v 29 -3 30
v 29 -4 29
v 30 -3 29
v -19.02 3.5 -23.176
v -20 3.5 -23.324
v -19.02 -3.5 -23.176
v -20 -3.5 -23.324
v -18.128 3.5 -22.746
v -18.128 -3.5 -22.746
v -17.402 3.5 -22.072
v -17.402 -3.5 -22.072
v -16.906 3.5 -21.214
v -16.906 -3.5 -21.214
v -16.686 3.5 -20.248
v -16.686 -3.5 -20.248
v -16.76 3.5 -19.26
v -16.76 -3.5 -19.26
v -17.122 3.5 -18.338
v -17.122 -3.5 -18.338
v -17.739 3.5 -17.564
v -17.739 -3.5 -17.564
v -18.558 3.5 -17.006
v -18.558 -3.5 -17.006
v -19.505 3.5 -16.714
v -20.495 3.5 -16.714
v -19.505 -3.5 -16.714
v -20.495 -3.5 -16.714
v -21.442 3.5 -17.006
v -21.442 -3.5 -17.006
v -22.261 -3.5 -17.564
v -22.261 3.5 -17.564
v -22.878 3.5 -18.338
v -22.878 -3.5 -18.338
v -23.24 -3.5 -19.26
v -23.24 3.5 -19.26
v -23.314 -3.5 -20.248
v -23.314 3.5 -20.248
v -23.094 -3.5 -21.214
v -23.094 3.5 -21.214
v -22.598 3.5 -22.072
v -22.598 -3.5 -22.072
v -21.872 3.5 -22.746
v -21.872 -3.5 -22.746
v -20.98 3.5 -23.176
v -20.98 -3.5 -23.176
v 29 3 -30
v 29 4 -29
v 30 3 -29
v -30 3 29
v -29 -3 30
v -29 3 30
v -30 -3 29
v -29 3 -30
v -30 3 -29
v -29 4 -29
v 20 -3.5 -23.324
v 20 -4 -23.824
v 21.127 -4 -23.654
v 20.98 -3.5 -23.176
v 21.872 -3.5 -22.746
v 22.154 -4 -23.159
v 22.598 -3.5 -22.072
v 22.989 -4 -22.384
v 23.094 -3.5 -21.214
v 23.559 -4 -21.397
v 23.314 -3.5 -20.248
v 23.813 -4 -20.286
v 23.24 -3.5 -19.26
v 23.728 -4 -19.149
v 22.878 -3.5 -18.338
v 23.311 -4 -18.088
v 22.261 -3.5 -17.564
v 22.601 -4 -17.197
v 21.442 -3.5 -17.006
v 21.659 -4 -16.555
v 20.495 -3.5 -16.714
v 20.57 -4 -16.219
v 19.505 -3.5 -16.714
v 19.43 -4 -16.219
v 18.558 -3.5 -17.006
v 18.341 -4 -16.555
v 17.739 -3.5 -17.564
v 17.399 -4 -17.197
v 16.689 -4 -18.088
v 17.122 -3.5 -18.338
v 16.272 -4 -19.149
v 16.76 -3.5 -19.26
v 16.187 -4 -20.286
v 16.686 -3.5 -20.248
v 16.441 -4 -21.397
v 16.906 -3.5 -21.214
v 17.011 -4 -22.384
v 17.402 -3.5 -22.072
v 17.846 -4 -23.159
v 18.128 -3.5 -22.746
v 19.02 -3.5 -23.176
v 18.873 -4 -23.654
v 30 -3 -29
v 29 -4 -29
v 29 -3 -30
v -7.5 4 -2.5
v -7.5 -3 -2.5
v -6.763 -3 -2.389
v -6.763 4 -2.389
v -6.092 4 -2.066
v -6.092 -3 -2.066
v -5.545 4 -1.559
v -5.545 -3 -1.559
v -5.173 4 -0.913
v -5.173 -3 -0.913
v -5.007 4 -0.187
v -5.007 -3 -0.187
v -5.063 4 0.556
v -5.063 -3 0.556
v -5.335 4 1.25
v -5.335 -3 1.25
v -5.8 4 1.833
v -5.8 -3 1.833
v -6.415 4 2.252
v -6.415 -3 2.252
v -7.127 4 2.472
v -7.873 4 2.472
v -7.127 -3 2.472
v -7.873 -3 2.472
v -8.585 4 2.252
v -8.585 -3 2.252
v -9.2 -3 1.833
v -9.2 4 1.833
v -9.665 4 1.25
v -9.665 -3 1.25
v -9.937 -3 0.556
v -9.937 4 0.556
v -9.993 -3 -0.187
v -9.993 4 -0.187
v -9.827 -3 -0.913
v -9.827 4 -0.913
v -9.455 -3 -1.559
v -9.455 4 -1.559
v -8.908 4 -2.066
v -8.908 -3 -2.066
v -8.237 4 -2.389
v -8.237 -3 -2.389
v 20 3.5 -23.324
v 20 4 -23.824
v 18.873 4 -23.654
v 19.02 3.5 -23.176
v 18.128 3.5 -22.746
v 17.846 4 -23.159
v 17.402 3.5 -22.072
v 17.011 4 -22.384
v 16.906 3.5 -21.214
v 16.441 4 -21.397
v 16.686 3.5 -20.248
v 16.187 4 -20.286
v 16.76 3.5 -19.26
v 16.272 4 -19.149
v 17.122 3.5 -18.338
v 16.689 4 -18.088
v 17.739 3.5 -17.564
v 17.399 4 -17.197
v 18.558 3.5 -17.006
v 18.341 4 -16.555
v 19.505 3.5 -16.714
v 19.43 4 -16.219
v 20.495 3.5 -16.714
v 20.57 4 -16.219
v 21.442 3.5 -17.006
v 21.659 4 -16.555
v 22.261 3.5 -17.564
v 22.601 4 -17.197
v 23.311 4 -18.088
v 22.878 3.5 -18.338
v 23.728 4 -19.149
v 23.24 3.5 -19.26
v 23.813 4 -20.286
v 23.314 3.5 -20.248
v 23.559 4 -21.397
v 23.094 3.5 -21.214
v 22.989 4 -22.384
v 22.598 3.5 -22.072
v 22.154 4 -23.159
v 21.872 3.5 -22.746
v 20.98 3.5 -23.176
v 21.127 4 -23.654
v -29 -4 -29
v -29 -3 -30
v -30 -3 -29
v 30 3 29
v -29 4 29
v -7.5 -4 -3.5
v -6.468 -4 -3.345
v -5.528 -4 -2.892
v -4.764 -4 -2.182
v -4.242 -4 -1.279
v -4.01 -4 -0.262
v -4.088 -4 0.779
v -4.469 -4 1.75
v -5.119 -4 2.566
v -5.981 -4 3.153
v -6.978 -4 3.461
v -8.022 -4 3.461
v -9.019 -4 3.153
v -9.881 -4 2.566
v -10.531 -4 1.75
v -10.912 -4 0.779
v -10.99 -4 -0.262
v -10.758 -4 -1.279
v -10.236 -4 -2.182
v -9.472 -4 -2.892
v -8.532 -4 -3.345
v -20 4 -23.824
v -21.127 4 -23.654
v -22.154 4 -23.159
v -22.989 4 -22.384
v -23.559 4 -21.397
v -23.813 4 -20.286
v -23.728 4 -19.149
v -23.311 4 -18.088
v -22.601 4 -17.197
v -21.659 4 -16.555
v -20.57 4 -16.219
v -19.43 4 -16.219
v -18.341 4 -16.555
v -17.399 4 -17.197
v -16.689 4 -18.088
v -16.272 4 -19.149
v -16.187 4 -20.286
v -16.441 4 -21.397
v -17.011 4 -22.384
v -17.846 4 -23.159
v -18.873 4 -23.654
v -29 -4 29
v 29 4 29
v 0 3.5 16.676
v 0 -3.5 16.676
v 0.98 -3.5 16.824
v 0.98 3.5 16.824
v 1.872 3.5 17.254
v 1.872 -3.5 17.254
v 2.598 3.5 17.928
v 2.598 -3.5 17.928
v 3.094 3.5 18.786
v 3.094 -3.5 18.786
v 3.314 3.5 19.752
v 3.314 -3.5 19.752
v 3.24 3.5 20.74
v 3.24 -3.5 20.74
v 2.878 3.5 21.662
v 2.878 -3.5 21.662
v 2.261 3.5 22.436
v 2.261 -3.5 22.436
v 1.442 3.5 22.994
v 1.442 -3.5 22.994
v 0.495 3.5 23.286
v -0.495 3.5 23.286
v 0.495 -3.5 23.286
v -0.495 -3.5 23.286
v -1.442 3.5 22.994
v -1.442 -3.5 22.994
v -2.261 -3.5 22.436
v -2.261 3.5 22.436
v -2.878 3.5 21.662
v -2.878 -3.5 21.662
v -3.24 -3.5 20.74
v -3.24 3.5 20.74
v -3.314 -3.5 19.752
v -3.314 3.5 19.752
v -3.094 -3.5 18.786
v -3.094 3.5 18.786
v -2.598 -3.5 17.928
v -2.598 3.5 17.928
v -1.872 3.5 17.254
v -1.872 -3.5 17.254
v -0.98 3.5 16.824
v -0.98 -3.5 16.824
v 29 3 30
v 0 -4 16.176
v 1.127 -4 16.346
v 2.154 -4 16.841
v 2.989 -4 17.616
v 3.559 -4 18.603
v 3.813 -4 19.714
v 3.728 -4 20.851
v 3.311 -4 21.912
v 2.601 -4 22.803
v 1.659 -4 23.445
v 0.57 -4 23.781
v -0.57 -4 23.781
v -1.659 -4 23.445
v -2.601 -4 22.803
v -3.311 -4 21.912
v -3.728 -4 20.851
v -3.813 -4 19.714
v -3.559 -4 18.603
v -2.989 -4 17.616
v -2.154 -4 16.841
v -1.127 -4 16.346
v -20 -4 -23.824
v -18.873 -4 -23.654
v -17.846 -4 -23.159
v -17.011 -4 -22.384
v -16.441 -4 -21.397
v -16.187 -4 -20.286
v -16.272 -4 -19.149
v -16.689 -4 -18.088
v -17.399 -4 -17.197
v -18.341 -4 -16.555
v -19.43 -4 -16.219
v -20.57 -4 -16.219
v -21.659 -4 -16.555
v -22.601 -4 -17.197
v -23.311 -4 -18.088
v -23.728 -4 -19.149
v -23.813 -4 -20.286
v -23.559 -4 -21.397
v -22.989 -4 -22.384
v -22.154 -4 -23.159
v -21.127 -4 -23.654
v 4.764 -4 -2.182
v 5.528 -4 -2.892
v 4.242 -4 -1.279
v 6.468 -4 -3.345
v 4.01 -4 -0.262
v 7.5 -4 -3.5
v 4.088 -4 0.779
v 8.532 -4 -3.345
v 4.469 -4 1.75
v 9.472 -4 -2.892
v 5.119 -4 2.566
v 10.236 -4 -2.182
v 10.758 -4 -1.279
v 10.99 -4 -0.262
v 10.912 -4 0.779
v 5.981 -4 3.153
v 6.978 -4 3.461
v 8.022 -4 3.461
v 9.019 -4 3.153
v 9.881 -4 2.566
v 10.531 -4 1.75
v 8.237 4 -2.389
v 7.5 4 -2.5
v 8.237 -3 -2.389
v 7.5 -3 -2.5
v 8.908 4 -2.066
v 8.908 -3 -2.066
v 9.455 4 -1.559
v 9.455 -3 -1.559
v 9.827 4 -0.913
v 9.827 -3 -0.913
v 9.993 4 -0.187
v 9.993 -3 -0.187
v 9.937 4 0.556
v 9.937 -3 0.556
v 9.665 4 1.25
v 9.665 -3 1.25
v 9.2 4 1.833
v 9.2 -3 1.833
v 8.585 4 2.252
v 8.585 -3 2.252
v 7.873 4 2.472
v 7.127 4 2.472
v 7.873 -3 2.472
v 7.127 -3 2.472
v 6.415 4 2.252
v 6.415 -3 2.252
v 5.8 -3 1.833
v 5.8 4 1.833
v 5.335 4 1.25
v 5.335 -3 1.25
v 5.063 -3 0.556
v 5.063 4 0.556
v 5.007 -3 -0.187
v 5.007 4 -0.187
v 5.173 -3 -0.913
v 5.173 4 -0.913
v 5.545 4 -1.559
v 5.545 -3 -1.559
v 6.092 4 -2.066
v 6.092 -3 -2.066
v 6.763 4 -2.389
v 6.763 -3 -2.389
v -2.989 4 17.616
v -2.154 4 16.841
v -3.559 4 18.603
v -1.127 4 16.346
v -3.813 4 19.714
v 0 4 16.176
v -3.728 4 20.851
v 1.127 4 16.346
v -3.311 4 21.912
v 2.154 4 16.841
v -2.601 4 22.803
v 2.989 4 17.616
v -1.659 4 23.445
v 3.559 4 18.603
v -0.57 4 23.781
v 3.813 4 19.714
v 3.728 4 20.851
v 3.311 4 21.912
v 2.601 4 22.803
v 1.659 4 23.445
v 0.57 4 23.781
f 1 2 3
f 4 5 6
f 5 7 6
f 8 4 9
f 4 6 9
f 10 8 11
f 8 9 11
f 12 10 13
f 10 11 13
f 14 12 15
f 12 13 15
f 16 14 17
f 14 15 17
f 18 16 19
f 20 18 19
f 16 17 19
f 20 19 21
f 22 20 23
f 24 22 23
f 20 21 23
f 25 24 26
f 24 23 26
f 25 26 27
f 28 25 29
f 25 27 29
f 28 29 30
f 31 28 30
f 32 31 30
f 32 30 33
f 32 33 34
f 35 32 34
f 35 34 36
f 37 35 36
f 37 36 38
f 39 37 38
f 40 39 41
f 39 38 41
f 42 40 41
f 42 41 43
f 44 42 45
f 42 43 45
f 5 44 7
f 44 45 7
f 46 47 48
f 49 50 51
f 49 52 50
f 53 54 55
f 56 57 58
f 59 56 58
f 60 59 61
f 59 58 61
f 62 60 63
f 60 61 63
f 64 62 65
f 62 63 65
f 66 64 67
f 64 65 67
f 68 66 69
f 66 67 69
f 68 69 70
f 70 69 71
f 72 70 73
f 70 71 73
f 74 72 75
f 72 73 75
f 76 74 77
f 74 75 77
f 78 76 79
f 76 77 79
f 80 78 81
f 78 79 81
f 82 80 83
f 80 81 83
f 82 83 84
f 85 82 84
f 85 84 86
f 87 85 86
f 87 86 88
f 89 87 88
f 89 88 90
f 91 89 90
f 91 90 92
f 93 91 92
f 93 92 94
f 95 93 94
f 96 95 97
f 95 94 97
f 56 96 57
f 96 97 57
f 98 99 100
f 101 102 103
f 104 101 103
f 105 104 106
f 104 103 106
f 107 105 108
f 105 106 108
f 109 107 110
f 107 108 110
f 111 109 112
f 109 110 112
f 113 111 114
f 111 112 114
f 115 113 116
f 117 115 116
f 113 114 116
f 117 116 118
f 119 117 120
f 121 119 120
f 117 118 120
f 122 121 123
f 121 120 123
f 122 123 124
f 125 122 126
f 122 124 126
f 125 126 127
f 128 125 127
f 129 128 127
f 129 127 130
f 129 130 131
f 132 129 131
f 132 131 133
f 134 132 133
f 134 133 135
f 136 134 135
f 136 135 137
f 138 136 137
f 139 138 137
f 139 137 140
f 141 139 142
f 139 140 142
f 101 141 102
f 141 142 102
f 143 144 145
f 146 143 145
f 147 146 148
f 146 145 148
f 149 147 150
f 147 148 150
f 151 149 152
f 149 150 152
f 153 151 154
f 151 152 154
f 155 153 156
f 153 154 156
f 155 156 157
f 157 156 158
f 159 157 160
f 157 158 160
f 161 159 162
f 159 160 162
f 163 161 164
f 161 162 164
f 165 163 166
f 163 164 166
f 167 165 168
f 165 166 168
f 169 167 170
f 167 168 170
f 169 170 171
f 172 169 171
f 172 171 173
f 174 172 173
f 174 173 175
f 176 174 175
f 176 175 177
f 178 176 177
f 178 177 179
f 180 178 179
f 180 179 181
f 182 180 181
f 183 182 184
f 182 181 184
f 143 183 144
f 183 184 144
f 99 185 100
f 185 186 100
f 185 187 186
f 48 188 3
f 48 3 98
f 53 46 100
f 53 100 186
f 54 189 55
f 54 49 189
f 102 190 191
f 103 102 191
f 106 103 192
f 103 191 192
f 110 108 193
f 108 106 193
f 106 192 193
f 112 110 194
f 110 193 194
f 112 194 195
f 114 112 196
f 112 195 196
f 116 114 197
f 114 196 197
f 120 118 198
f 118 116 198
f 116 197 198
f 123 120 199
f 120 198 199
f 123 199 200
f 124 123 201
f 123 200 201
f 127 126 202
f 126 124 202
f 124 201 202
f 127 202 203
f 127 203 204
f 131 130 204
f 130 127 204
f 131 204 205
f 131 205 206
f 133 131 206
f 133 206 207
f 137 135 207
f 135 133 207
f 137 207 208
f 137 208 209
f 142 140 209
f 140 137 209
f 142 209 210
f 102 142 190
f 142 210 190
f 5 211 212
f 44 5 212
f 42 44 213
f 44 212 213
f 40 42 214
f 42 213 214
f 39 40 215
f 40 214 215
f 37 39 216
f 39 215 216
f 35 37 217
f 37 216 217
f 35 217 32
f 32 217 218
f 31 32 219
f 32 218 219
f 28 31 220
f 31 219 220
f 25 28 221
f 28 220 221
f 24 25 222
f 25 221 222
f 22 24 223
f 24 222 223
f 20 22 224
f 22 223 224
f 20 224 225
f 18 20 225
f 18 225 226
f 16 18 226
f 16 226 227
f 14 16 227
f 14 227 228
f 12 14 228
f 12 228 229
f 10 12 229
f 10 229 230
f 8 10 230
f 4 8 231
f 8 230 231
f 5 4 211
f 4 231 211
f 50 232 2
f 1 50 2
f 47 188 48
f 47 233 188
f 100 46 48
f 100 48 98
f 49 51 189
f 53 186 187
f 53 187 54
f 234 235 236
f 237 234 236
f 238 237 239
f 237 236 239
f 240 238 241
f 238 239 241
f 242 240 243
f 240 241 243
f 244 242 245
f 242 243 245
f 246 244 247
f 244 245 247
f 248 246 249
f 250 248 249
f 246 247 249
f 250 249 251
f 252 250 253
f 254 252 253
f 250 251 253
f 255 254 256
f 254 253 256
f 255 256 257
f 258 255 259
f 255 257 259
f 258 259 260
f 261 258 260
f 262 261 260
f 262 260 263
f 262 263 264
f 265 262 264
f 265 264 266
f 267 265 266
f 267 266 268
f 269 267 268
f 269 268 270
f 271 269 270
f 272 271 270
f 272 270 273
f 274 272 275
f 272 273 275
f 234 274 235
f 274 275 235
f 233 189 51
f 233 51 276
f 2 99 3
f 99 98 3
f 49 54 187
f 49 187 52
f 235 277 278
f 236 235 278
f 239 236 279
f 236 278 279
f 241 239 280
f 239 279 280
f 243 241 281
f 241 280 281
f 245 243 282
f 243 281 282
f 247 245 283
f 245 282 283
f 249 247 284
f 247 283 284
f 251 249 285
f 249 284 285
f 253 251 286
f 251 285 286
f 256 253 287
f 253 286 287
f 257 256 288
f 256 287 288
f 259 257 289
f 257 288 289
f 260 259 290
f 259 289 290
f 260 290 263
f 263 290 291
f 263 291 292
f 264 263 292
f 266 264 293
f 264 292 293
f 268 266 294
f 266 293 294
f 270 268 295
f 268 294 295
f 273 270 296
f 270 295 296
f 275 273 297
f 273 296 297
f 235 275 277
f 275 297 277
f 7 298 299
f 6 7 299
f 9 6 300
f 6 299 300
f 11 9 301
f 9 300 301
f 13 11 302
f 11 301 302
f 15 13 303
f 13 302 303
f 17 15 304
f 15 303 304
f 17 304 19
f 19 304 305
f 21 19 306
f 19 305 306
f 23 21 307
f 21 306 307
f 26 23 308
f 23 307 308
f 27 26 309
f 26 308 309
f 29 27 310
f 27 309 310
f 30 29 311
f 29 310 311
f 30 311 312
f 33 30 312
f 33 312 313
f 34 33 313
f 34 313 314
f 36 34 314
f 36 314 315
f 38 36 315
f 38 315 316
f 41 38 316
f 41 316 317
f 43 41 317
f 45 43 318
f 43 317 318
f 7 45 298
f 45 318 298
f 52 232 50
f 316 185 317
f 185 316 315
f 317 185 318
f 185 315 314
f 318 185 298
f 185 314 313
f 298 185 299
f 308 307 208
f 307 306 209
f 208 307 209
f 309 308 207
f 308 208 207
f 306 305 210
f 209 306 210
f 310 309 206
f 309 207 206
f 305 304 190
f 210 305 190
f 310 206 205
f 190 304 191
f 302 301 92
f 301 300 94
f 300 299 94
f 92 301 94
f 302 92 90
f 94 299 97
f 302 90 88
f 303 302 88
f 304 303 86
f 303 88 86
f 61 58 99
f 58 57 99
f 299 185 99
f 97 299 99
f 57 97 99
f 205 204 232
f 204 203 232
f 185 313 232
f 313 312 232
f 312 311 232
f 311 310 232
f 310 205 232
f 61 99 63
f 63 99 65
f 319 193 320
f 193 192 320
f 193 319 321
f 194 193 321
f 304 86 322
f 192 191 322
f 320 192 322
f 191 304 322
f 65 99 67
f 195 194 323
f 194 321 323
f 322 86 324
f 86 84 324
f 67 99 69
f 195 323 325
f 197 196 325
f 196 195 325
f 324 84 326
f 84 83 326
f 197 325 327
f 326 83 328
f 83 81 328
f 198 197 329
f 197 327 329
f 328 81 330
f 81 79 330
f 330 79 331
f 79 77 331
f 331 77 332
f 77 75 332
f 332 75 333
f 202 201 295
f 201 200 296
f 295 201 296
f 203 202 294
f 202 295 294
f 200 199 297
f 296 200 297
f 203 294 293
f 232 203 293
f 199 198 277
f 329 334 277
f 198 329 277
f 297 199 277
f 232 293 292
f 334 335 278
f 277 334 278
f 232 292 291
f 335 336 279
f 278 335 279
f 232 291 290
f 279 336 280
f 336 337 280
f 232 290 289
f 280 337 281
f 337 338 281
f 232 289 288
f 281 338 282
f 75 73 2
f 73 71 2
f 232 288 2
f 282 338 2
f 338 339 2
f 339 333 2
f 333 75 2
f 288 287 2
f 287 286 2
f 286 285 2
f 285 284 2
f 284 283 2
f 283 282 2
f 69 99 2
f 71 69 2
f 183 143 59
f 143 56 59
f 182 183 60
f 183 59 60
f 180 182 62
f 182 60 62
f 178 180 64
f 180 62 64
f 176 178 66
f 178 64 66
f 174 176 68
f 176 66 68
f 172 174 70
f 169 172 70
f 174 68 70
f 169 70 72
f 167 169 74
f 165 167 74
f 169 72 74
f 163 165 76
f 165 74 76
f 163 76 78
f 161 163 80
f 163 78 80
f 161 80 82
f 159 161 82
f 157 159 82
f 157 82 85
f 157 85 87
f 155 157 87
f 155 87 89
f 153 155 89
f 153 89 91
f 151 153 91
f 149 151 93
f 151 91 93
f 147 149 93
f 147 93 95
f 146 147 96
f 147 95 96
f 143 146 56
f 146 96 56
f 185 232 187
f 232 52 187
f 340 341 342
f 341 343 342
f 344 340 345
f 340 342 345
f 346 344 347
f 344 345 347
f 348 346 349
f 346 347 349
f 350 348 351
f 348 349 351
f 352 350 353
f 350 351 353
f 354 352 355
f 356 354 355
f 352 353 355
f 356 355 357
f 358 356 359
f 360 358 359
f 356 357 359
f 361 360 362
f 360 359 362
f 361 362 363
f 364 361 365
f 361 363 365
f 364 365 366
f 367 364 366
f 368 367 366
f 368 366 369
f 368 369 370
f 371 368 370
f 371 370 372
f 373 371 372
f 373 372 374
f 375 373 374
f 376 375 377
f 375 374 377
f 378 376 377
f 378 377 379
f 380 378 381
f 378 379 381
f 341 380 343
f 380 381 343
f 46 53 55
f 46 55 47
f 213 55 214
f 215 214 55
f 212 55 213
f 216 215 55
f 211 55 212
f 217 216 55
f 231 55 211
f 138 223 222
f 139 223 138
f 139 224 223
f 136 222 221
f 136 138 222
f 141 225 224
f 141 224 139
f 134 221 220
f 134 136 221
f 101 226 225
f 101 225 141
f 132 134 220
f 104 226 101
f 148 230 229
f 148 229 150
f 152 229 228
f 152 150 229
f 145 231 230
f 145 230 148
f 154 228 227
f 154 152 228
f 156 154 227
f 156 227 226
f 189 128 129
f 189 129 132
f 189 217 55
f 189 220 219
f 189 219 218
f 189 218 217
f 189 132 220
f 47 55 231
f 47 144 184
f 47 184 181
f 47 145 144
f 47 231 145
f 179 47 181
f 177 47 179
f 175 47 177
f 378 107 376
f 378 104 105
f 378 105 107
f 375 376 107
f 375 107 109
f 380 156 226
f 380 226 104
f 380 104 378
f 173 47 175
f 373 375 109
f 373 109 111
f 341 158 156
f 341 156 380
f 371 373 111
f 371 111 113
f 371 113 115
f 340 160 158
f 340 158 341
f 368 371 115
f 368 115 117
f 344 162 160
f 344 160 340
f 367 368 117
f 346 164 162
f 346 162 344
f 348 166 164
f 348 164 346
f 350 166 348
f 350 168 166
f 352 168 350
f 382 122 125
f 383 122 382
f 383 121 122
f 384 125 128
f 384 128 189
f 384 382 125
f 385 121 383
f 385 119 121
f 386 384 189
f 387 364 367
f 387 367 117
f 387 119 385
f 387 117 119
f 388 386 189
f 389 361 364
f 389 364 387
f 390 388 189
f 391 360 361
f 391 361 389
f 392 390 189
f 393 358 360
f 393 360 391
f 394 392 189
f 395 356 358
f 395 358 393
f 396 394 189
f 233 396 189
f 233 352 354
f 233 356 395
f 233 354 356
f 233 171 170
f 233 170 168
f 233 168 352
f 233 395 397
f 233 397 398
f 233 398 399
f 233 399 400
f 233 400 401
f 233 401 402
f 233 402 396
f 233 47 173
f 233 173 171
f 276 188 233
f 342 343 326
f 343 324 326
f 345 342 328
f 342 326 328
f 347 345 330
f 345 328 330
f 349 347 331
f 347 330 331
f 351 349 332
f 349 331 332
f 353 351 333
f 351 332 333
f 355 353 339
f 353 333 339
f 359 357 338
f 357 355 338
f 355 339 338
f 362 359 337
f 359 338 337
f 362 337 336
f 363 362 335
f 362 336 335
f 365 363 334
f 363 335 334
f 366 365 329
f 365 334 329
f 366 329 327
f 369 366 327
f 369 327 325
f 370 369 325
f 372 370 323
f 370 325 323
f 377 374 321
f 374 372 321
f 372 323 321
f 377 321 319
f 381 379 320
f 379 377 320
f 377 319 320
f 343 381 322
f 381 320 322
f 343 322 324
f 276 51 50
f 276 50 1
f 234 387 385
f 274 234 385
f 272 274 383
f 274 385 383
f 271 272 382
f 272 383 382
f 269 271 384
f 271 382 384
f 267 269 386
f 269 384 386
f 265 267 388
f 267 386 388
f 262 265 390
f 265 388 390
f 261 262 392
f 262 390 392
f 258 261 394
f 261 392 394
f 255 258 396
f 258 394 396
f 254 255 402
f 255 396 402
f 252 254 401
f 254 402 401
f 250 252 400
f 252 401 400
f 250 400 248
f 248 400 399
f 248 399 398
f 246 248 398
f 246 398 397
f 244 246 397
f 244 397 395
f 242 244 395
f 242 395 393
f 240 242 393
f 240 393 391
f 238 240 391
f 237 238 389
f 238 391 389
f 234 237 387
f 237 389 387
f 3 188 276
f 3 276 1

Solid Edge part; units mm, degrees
sketch "Sketch1" plane through (0, 0, 0) normal (0, -1, 0) x (1, 0, 0)
  line L0 (-30, 30) -> (30, 30)
  line L1 (30, 30) -> (30, -30)
  line L2 (30, -30) -> (-30, -30)
  line L3 (-30, -30) -> (-30, 30)
  dimension "D1" = 60
  dimension "D2" = 60
extrude "Protrusion1" add sketch "Sketch1" along normal mid plane 8
hole "Bohrung_1" at (-20, -4, -20) direction (0, 1, 0) diameter 6.647 end up to next thread major 8 thread length 2
hole "Hole1" at (20, -4, -20) direction (0, 1, 0) diameter 6.647 end up to next thread major 8 thread length 2
hole "Hole2" at (0, -4, 20) direction (0, 1, 0) diameter 6.647 end up to next thread major 8 thread length 2
hole "Bohrung_4" at (7.5, -4, 0) direction (0, 1, 0) diameter 5 end up to next countersink diameter 7 countersink angle 90
hole "Hole3" at (-7.5, -4, 0) direction (0, 1, 0) diameter 5 end up to next countersink diameter 7 countersink angle 90
chamfer "Fase_1" distance 1 angle 45 12 edges at (0, -4, 30) (-30, -4, 0) (30, -4, 0) (30, 4, 0) (30, 0, 30) (0, 4, 30) (-30, 0, 30) (-30, 4, 0) (-30, 0, -30) (0, 4, -30) (0, -4, -30) (30, 0, -30)
chamfer "Fase_2" distance 0.5 angle 45 6 edges at (-3.3235, -4, 20) (0, 4, 16.6765) (16.6765, -4, -20) (20, 4, -23.3235) (-23.3235, -4, -20) (-20, 4, -23.3235)
